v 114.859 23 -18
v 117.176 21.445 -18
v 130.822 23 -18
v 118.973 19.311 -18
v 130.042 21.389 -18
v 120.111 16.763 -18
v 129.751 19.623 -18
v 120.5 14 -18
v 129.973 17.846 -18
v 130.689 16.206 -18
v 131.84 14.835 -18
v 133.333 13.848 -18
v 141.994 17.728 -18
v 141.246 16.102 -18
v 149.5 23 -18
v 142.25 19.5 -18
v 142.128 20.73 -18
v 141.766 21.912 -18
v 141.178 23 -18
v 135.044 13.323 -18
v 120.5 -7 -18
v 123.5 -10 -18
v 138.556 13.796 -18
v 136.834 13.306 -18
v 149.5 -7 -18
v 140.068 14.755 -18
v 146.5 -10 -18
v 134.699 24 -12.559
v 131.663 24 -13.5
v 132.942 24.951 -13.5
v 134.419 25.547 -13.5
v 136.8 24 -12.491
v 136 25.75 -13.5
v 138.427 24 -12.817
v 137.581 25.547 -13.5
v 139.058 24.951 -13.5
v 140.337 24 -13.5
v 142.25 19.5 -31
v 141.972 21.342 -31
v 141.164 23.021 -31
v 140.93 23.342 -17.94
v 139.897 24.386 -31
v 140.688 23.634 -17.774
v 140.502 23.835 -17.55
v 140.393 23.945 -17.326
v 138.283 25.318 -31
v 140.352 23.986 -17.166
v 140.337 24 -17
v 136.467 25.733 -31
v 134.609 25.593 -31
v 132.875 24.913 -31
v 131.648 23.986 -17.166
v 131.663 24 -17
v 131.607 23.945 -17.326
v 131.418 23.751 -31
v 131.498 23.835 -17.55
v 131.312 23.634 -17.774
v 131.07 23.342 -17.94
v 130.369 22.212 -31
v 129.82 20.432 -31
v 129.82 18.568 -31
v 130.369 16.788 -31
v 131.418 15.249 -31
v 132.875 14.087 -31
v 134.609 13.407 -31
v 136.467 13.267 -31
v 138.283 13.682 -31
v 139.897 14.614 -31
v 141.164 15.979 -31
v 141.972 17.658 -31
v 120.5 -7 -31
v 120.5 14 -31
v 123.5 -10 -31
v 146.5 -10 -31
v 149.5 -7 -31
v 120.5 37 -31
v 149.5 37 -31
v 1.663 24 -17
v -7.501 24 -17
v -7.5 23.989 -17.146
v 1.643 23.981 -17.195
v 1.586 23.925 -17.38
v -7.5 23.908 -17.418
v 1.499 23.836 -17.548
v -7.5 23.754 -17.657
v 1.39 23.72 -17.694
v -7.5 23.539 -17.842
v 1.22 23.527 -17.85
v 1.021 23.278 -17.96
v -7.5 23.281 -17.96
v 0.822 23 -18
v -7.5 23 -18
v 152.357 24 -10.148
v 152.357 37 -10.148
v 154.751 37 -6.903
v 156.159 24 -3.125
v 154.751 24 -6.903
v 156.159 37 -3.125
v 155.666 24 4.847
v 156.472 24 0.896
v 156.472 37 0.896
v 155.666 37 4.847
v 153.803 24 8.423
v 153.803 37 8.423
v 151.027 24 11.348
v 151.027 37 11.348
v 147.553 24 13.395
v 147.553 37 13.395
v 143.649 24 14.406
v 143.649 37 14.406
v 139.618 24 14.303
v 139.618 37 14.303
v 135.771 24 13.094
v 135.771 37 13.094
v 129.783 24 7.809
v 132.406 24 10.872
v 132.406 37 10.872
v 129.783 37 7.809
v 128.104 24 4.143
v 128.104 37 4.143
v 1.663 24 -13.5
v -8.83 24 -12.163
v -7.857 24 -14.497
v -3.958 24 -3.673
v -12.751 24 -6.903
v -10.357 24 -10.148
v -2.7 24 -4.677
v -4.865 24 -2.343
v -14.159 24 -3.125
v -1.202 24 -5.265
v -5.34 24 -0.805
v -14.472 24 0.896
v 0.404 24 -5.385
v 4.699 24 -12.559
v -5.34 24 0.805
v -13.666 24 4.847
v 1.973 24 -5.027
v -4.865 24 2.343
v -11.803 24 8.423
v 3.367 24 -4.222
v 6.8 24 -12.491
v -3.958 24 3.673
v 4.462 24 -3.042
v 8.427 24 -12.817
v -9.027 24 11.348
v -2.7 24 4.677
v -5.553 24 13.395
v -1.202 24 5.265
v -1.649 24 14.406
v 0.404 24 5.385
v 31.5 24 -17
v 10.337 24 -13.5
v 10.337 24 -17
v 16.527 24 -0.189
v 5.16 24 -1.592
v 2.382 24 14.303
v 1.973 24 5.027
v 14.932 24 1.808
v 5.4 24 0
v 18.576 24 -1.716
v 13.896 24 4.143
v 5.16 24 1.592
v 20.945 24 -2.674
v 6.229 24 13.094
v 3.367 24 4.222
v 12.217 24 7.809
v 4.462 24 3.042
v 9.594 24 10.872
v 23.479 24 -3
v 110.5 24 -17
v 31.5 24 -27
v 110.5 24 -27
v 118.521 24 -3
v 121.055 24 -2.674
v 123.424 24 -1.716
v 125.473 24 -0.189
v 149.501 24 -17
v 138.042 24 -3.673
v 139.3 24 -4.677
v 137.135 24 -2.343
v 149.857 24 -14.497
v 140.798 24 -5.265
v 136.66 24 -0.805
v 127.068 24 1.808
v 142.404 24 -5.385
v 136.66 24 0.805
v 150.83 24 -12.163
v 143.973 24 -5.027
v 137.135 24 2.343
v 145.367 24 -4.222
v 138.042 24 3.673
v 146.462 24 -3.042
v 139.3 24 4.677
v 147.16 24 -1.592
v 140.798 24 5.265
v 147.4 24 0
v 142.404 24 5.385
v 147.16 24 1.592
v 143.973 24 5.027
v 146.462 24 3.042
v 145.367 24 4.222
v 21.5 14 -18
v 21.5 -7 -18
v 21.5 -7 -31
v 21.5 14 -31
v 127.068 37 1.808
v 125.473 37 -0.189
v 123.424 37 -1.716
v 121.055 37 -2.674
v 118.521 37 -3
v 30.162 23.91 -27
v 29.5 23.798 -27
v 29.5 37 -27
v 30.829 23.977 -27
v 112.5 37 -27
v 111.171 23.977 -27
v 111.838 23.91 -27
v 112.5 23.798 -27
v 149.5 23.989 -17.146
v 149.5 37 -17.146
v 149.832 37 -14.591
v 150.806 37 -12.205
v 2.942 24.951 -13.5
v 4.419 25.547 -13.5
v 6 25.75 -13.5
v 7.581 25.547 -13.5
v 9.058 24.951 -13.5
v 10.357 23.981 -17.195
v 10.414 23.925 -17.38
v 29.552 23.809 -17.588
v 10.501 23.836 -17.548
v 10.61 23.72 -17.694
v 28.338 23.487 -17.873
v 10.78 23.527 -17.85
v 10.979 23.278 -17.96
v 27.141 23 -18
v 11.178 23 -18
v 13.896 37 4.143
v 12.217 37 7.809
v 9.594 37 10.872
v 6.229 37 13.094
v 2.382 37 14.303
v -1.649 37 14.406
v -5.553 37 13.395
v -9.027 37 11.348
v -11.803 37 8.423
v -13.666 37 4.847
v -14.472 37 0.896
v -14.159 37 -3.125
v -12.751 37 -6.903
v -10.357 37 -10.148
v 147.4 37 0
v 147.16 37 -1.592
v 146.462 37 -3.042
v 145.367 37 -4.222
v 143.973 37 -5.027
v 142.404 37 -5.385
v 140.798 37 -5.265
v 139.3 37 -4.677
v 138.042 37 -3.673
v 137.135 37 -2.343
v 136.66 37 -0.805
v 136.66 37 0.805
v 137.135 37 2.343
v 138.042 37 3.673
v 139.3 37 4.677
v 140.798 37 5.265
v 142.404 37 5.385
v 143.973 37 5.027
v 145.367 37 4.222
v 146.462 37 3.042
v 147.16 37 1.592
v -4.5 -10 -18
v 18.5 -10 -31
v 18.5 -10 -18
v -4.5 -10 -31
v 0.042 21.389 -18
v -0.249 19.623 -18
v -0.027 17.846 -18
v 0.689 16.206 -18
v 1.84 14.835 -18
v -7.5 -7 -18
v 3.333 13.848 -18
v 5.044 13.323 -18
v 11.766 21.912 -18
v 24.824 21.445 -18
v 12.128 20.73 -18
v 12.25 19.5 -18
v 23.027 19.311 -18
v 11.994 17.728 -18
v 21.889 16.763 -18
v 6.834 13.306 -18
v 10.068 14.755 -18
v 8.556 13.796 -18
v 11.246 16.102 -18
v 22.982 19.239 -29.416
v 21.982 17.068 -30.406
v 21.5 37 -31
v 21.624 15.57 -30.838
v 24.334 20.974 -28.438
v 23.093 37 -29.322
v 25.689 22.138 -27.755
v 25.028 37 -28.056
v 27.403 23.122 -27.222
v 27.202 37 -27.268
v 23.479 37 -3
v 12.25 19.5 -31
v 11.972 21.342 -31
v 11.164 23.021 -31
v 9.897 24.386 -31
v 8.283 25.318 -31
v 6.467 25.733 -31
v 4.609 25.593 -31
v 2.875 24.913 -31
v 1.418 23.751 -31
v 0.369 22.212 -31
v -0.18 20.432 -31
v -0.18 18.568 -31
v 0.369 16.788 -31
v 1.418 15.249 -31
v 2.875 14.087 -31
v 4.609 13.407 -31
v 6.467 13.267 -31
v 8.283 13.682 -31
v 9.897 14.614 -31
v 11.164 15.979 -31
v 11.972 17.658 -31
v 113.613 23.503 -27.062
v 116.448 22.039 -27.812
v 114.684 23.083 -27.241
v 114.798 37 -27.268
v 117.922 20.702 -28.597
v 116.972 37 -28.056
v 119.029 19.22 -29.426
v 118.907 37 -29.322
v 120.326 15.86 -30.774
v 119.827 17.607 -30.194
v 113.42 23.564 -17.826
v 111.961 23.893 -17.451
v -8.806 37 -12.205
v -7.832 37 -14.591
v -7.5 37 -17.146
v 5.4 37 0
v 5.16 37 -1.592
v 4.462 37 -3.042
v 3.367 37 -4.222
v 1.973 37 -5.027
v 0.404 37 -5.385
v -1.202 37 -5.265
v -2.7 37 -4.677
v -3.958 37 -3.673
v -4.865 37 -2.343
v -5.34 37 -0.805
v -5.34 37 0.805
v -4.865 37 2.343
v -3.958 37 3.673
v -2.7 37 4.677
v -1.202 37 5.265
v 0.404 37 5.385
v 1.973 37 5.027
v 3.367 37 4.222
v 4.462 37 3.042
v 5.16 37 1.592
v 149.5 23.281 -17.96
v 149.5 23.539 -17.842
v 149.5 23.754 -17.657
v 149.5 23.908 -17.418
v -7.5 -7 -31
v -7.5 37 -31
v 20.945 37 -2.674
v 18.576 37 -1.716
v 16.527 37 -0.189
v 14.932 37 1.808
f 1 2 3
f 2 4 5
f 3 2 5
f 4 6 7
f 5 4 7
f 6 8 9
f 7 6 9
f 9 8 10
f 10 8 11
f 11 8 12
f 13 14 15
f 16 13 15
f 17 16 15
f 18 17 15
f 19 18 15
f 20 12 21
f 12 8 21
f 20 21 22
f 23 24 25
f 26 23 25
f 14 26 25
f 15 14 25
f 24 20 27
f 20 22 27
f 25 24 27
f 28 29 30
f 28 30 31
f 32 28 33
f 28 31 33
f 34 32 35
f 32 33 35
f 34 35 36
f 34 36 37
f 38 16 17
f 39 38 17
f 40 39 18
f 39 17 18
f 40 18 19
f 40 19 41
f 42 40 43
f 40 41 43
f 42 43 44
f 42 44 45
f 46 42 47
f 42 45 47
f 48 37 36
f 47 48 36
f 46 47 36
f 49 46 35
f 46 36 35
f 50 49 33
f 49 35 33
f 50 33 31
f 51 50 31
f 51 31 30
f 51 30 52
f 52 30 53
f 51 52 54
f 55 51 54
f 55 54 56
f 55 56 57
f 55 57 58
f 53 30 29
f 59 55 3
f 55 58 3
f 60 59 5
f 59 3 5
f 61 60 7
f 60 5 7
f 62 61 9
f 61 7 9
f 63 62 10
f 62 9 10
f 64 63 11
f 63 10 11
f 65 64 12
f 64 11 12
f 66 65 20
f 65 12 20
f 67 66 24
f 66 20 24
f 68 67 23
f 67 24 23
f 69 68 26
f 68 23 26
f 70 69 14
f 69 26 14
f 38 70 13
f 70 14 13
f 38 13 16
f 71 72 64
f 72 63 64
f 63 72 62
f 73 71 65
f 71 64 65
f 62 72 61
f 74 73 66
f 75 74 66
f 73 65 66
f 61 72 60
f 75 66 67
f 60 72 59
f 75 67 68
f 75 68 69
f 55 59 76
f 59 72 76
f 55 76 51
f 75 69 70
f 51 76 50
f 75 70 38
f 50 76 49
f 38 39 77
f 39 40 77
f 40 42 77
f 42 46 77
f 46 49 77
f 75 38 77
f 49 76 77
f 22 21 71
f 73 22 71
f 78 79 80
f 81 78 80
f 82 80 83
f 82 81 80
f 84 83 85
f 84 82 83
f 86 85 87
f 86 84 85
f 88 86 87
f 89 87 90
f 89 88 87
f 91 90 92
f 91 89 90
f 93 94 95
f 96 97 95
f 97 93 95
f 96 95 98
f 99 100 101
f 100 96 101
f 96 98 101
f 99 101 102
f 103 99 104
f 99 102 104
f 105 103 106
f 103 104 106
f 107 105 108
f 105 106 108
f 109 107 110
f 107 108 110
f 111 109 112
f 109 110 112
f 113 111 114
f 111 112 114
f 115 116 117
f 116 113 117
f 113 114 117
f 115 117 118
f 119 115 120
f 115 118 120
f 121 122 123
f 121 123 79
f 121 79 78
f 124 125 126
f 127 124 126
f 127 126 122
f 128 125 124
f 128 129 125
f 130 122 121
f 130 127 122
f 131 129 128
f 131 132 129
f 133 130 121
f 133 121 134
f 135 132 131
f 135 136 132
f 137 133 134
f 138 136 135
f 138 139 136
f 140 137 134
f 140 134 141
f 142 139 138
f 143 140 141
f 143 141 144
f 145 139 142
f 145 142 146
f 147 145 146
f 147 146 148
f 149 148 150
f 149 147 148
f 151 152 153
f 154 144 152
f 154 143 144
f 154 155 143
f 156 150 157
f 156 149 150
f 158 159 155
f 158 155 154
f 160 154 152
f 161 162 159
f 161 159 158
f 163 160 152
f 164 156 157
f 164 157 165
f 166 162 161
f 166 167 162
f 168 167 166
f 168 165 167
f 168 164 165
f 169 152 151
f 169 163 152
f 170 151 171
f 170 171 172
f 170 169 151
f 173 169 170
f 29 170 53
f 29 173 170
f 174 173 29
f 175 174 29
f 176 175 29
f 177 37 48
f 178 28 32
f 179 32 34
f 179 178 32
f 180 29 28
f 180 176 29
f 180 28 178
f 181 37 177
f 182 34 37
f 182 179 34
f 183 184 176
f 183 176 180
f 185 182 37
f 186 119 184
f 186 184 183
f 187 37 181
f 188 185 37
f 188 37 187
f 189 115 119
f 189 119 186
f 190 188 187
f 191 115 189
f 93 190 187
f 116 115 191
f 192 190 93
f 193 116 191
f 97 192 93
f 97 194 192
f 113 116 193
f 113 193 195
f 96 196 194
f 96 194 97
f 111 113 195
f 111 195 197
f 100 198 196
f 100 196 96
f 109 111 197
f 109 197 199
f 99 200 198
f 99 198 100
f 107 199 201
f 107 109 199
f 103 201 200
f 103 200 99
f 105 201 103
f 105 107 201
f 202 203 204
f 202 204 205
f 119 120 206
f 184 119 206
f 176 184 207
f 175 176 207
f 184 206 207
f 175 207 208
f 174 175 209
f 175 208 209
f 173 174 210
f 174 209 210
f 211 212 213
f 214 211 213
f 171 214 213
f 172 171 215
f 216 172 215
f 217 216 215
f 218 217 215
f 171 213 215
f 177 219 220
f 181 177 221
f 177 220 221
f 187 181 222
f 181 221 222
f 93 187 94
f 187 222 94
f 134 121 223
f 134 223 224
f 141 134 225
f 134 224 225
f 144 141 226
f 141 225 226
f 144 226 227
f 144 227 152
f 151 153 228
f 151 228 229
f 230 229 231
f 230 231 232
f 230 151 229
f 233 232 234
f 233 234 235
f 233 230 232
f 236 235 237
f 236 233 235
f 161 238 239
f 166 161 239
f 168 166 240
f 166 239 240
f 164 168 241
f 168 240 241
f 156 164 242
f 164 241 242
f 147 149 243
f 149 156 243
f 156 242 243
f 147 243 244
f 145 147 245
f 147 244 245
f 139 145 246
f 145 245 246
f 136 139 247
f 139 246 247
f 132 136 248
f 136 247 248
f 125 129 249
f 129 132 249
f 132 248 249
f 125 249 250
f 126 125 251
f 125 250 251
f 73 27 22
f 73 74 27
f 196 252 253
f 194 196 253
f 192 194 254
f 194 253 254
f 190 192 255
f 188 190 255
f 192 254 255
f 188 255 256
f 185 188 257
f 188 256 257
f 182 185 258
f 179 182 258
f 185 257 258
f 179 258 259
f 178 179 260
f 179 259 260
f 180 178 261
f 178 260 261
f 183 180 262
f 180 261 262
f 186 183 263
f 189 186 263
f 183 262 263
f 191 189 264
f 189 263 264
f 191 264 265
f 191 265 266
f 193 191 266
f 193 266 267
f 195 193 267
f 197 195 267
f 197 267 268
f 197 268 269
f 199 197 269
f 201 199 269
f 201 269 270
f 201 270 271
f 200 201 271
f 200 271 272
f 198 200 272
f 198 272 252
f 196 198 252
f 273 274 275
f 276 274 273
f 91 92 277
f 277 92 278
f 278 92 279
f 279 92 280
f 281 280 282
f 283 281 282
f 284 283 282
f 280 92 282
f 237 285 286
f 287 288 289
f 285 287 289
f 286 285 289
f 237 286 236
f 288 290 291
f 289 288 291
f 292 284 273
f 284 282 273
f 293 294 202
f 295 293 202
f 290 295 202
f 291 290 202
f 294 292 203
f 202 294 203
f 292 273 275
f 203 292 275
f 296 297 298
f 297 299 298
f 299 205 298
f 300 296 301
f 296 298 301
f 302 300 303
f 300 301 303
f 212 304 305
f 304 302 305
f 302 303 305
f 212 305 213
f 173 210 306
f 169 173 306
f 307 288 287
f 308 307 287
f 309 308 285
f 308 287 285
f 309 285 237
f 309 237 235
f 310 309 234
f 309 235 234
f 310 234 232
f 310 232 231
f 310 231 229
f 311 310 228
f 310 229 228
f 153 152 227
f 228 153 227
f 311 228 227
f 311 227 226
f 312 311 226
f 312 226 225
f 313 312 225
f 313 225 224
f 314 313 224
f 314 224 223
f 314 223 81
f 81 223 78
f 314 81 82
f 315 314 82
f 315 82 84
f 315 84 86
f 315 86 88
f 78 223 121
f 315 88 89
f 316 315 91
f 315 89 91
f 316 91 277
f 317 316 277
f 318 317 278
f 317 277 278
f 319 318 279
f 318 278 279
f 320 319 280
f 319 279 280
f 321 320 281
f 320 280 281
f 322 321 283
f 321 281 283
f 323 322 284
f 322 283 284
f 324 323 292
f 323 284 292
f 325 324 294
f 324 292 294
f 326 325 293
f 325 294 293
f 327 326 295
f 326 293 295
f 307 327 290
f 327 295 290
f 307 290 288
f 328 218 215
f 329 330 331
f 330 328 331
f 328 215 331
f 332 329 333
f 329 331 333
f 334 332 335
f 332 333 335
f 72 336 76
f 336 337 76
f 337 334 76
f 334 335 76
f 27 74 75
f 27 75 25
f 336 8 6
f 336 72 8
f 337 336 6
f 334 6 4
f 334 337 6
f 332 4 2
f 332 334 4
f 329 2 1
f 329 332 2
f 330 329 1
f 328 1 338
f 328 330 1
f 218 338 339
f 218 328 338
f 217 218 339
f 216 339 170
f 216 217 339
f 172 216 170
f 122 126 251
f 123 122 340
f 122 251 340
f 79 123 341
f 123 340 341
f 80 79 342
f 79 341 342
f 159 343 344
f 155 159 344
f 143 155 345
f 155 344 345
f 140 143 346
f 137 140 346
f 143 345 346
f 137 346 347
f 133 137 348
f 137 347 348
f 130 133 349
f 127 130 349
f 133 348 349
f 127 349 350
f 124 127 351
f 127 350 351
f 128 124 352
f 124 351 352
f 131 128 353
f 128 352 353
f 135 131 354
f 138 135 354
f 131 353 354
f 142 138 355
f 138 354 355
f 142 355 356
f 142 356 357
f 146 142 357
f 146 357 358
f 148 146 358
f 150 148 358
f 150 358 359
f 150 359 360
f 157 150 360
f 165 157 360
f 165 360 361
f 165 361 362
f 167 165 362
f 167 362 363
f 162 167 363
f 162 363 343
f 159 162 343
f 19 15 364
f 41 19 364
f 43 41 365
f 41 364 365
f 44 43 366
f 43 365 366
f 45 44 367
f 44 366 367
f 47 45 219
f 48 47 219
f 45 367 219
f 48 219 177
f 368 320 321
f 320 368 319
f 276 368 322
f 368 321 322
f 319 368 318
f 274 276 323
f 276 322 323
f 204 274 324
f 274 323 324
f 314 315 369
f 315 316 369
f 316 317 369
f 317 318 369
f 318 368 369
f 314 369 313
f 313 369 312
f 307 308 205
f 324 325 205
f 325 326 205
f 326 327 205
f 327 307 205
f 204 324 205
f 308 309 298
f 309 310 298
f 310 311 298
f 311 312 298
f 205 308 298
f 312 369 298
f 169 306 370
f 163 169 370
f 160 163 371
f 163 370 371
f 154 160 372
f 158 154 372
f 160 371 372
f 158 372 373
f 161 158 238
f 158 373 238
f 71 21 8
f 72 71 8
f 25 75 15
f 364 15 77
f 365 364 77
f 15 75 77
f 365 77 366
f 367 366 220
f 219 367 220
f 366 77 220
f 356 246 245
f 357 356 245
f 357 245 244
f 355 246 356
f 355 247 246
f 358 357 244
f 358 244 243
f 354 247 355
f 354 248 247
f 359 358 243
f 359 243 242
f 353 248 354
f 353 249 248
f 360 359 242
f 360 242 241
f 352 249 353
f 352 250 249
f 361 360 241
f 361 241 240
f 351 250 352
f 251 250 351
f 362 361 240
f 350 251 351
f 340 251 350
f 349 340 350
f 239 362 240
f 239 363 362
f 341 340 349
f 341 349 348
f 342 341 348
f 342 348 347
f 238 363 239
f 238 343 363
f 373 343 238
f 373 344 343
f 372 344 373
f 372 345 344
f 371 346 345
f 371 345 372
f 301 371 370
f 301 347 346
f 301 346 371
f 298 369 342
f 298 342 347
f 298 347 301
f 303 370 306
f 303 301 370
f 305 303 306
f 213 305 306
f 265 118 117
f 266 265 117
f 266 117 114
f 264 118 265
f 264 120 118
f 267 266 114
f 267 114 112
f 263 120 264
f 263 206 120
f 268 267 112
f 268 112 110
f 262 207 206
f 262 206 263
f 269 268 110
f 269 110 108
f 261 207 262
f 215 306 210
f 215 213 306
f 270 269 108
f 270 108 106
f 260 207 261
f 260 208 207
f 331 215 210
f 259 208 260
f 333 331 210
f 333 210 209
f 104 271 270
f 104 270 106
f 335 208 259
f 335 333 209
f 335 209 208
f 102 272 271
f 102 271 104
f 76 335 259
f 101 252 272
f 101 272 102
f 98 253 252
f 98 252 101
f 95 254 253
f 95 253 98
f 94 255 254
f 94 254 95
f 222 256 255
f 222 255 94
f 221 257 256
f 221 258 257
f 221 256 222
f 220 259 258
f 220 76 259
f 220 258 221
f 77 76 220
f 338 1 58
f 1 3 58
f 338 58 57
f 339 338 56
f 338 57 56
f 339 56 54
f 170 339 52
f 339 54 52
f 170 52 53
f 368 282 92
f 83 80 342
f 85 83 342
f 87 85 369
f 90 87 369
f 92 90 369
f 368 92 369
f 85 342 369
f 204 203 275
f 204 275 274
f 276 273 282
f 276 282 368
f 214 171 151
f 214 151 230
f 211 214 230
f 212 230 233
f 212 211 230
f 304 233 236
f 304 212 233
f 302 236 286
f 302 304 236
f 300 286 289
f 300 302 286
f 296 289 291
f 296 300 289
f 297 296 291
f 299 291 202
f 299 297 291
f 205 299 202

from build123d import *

# Parameters (mm, degrees)
BOSS_EXTRU_1_DEPTH           = 38
BOSS_EXTRU_1_DEPTH_BACK      = 10
ESQUISSE8_W                  = 200
ESQUISSE8_H                  = 45
ENL_V_MAT_EXTRU_4_DEPTH      = 34
TROU_TARAUD_M14X1_51_D       = 12.5
TROU_TARAUD_M14X1_51_DEPTH   = 17.5
TROU_TARAUD_M14X1_51_TIP     = 3.755378869
ESQUISSE10_W                 = 99
ESQUISSE10_H                 = 34
ENL_V_MAT_EXTRU_6_DEPTH      = 14
CONG_2_R                     = 10
ENL_V_MAT_EXTRU_7_DEPTH      = 1
ENL_V_MAT_EXTRU_7_DEPTH_BACK = 49
TROU_TARAUD_M12X1_251_D      = 10.8
CHANFREIN1_SIZE              = 3
CONG_3_R                     = 1
ESQUISSE14_W                 = 218.12810102
ESQUISSE14_H                 = 78.447864133
ENL_V_MAT_EXTRU_8_DEPTH      = 1


with BuildPart() as part:
    # Esquisse1 → Boss.-Extru.1 (new body, two sides)
    with BuildSketch(Plane(origin=(0, 0, 0), x_dir=(1, 0, 0), z_dir=(0, 1, 0))) as boss_extru_1_sk:
        with BuildLine():
            Line((-7.5, 31), (149.5, 31))
            Line((149.5, 31), (149.5, 17.146428199))
            ThreePointArc((149.5, 17.146428199), (150.241799002, 13.366783469), (152.357142857, 10.147886077))
            ThreePointArc((152.357142857, 10.147886077), (149.361144189, -12.492540023), (128.104434711, -4.142857143))
            ThreePointArc((128.104434711, -4.142857143), (124.497429283, 1.017837257), (118.521286236, 3))
            Line((118.521286236, 3), (23.478713764, 3))
            ThreePointArc((23.478713764, 3), (17.502570717, 1.017837257), (13.895565289, -4.142857143))
            ThreePointArc((13.895565289, -4.142857143), (-7.361144189, -12.492540023), (-10.357142857, 10.147886077))
            ThreePointArc((-10.357142857, 10.147886077), (-8.241799002, 13.366783469), (-7.5, 17.146428199))
            Line((-7.5, 17.146428199), (-7.5, 31))
        make_face()
    extrude(amount=BOSS_EXTRU_1_DEPTH)
    extrude(boss_extru_1_sk.sketch, amount=-BOSS_EXTRU_1_DEPTH_BACK)

    # Esquisse8 → Enlèv. mat.-Extru.4 (cut)
    with BuildSketch(Plane.XZ.offset(10)):
        with Locations((75, 4.5)):
            Rectangle(ESQUISSE8_W, ESQUISSE8_H)
    extrude(amount=-ENL_V_MAT_EXTRU_4_DEPTH, mode=Mode.SUBTRACT)

    # Trou taraudé M14x1.51
    with Locations(Plane(origin=(0, 0, -31), x_dir=(-1, 0, 0), z_dir=(0, 0, -1))):
        with Locations((-136, 19.5), (-6, 19.5)):
            Hole(TROU_TARAUD_M14X1_51_D / 2, depth=TROU_TARAUD_M14X1_51_DEPTH)
            with Locations((0, 0, -(TROU_TARAUD_M14X1_51_DEPTH + TROU_TARAUD_M14X1_51_TIP / 2))):  # 118° drill point
                Cone(0, TROU_TARAUD_M14X1_51_D / 2, TROU_TARAUD_M14X1_51_TIP, mode=Mode.SUBTRACT)

    # Esquisse10 → Enlèv. mat.-Extru.6 (cut, through all)
    with BuildSketch(Plane.XY.offset(-18)):
        with Locations((71, 7)):
            Rectangle(ESQUISSE10_W, ESQUISSE10_H)
    extrude(amount=-ENL_V_MAT_EXTRU_6_DEPTH, mode=Mode.SUBTRACT)

    # Congé2
    cong_2_edges = [part.edges().sort_by_distance(p)[0] for p in [
        (21.5, 24, -24.5),
        (120.5, 24, -24.5),
    ]]
    fillet(cong_2_edges, radius=CONG_2_R)

    # Esquisse11 → Enlèv. mat.-Extru.7 (cut, two sides)
    with BuildSketch(Plane(origin=(0, 38, 0), x_dir=(1, 0, 0), z_dir=(0, 1, 0))) as enl_v_mat_extru_7_sk:
        with BuildLine():
            Line((29.5, 27), (112.5, 27))
            ThreePointArc((112.5, 27), (119.571067812, 29.928932188), (122.5, 37))
            Line((122.5, 37), (122.5, 47))
            Line((122.5, 47), (19.5, 47))
            Line((19.5, 47), (19.5, 37))
            ThreePointArc((19.5, 37), (22.428932188, 29.928932188), (29.5, 27))
        make_face()
    extrude(amount=ENL_V_MAT_EXTRU_7_DEPTH, mode=Mode.SUBTRACT)
    extrude(enl_v_mat_extru_7_sk.sketch, amount=-ENL_V_MAT_EXTRU_7_DEPTH_BACK, mode=Mode.SUBTRACT)

    # Trou taraudé M12x1.251 (through all)
    with Locations(Plane(origin=(0, 24, 0), x_dir=(-1, 0, 0), z_dir=(0, -1, 0))):
        with Locations((0, 0), (-142, 0)):
            Hole(TROU_TARAUD_M12X1_251_D / 2)

    # Chanfrein1
    chanfrein1_edges = [part.edges().sort_by_distance(p)[0] for p in [
        (21.5, -10, -24.5),
        (120.5, -10, -24.5),
        (-7.5, -10, -24.5),
        (149.5, -10, -24.5),
    ]]
    chamfer(chanfrein1_edges, length=CHANFREIN1_SIZE)

    # Congé3
    cong_3_edges = [part.edges().sort_by_distance(p)[0] for p in [
        (144.918668947, 24, -18),
        (121.081331053, 24, -18),
        (20.918668947, 24, -18),
        (-2.918668947, 24, -18),
    ]]
    fillet(cong_3_edges, radius=CONG_3_R)

    # Esquisse14 → Enlèv. mat.-Extru.8 (cut)
    with BuildSketch(Plane(origin=(0, 38, 0), x_dir=(1, 0, 0), z_dir=(0, 1, 0))):
        with Locations((74.423535218, 6.641931997)):
            Rectangle(ESQUISSE14_W, ESQUISSE14_H)
    extrude(amount=-ENL_V_MAT_EXTRU_8_DEPTH, mode=Mode.SUBTRACT)


solid = part.part
